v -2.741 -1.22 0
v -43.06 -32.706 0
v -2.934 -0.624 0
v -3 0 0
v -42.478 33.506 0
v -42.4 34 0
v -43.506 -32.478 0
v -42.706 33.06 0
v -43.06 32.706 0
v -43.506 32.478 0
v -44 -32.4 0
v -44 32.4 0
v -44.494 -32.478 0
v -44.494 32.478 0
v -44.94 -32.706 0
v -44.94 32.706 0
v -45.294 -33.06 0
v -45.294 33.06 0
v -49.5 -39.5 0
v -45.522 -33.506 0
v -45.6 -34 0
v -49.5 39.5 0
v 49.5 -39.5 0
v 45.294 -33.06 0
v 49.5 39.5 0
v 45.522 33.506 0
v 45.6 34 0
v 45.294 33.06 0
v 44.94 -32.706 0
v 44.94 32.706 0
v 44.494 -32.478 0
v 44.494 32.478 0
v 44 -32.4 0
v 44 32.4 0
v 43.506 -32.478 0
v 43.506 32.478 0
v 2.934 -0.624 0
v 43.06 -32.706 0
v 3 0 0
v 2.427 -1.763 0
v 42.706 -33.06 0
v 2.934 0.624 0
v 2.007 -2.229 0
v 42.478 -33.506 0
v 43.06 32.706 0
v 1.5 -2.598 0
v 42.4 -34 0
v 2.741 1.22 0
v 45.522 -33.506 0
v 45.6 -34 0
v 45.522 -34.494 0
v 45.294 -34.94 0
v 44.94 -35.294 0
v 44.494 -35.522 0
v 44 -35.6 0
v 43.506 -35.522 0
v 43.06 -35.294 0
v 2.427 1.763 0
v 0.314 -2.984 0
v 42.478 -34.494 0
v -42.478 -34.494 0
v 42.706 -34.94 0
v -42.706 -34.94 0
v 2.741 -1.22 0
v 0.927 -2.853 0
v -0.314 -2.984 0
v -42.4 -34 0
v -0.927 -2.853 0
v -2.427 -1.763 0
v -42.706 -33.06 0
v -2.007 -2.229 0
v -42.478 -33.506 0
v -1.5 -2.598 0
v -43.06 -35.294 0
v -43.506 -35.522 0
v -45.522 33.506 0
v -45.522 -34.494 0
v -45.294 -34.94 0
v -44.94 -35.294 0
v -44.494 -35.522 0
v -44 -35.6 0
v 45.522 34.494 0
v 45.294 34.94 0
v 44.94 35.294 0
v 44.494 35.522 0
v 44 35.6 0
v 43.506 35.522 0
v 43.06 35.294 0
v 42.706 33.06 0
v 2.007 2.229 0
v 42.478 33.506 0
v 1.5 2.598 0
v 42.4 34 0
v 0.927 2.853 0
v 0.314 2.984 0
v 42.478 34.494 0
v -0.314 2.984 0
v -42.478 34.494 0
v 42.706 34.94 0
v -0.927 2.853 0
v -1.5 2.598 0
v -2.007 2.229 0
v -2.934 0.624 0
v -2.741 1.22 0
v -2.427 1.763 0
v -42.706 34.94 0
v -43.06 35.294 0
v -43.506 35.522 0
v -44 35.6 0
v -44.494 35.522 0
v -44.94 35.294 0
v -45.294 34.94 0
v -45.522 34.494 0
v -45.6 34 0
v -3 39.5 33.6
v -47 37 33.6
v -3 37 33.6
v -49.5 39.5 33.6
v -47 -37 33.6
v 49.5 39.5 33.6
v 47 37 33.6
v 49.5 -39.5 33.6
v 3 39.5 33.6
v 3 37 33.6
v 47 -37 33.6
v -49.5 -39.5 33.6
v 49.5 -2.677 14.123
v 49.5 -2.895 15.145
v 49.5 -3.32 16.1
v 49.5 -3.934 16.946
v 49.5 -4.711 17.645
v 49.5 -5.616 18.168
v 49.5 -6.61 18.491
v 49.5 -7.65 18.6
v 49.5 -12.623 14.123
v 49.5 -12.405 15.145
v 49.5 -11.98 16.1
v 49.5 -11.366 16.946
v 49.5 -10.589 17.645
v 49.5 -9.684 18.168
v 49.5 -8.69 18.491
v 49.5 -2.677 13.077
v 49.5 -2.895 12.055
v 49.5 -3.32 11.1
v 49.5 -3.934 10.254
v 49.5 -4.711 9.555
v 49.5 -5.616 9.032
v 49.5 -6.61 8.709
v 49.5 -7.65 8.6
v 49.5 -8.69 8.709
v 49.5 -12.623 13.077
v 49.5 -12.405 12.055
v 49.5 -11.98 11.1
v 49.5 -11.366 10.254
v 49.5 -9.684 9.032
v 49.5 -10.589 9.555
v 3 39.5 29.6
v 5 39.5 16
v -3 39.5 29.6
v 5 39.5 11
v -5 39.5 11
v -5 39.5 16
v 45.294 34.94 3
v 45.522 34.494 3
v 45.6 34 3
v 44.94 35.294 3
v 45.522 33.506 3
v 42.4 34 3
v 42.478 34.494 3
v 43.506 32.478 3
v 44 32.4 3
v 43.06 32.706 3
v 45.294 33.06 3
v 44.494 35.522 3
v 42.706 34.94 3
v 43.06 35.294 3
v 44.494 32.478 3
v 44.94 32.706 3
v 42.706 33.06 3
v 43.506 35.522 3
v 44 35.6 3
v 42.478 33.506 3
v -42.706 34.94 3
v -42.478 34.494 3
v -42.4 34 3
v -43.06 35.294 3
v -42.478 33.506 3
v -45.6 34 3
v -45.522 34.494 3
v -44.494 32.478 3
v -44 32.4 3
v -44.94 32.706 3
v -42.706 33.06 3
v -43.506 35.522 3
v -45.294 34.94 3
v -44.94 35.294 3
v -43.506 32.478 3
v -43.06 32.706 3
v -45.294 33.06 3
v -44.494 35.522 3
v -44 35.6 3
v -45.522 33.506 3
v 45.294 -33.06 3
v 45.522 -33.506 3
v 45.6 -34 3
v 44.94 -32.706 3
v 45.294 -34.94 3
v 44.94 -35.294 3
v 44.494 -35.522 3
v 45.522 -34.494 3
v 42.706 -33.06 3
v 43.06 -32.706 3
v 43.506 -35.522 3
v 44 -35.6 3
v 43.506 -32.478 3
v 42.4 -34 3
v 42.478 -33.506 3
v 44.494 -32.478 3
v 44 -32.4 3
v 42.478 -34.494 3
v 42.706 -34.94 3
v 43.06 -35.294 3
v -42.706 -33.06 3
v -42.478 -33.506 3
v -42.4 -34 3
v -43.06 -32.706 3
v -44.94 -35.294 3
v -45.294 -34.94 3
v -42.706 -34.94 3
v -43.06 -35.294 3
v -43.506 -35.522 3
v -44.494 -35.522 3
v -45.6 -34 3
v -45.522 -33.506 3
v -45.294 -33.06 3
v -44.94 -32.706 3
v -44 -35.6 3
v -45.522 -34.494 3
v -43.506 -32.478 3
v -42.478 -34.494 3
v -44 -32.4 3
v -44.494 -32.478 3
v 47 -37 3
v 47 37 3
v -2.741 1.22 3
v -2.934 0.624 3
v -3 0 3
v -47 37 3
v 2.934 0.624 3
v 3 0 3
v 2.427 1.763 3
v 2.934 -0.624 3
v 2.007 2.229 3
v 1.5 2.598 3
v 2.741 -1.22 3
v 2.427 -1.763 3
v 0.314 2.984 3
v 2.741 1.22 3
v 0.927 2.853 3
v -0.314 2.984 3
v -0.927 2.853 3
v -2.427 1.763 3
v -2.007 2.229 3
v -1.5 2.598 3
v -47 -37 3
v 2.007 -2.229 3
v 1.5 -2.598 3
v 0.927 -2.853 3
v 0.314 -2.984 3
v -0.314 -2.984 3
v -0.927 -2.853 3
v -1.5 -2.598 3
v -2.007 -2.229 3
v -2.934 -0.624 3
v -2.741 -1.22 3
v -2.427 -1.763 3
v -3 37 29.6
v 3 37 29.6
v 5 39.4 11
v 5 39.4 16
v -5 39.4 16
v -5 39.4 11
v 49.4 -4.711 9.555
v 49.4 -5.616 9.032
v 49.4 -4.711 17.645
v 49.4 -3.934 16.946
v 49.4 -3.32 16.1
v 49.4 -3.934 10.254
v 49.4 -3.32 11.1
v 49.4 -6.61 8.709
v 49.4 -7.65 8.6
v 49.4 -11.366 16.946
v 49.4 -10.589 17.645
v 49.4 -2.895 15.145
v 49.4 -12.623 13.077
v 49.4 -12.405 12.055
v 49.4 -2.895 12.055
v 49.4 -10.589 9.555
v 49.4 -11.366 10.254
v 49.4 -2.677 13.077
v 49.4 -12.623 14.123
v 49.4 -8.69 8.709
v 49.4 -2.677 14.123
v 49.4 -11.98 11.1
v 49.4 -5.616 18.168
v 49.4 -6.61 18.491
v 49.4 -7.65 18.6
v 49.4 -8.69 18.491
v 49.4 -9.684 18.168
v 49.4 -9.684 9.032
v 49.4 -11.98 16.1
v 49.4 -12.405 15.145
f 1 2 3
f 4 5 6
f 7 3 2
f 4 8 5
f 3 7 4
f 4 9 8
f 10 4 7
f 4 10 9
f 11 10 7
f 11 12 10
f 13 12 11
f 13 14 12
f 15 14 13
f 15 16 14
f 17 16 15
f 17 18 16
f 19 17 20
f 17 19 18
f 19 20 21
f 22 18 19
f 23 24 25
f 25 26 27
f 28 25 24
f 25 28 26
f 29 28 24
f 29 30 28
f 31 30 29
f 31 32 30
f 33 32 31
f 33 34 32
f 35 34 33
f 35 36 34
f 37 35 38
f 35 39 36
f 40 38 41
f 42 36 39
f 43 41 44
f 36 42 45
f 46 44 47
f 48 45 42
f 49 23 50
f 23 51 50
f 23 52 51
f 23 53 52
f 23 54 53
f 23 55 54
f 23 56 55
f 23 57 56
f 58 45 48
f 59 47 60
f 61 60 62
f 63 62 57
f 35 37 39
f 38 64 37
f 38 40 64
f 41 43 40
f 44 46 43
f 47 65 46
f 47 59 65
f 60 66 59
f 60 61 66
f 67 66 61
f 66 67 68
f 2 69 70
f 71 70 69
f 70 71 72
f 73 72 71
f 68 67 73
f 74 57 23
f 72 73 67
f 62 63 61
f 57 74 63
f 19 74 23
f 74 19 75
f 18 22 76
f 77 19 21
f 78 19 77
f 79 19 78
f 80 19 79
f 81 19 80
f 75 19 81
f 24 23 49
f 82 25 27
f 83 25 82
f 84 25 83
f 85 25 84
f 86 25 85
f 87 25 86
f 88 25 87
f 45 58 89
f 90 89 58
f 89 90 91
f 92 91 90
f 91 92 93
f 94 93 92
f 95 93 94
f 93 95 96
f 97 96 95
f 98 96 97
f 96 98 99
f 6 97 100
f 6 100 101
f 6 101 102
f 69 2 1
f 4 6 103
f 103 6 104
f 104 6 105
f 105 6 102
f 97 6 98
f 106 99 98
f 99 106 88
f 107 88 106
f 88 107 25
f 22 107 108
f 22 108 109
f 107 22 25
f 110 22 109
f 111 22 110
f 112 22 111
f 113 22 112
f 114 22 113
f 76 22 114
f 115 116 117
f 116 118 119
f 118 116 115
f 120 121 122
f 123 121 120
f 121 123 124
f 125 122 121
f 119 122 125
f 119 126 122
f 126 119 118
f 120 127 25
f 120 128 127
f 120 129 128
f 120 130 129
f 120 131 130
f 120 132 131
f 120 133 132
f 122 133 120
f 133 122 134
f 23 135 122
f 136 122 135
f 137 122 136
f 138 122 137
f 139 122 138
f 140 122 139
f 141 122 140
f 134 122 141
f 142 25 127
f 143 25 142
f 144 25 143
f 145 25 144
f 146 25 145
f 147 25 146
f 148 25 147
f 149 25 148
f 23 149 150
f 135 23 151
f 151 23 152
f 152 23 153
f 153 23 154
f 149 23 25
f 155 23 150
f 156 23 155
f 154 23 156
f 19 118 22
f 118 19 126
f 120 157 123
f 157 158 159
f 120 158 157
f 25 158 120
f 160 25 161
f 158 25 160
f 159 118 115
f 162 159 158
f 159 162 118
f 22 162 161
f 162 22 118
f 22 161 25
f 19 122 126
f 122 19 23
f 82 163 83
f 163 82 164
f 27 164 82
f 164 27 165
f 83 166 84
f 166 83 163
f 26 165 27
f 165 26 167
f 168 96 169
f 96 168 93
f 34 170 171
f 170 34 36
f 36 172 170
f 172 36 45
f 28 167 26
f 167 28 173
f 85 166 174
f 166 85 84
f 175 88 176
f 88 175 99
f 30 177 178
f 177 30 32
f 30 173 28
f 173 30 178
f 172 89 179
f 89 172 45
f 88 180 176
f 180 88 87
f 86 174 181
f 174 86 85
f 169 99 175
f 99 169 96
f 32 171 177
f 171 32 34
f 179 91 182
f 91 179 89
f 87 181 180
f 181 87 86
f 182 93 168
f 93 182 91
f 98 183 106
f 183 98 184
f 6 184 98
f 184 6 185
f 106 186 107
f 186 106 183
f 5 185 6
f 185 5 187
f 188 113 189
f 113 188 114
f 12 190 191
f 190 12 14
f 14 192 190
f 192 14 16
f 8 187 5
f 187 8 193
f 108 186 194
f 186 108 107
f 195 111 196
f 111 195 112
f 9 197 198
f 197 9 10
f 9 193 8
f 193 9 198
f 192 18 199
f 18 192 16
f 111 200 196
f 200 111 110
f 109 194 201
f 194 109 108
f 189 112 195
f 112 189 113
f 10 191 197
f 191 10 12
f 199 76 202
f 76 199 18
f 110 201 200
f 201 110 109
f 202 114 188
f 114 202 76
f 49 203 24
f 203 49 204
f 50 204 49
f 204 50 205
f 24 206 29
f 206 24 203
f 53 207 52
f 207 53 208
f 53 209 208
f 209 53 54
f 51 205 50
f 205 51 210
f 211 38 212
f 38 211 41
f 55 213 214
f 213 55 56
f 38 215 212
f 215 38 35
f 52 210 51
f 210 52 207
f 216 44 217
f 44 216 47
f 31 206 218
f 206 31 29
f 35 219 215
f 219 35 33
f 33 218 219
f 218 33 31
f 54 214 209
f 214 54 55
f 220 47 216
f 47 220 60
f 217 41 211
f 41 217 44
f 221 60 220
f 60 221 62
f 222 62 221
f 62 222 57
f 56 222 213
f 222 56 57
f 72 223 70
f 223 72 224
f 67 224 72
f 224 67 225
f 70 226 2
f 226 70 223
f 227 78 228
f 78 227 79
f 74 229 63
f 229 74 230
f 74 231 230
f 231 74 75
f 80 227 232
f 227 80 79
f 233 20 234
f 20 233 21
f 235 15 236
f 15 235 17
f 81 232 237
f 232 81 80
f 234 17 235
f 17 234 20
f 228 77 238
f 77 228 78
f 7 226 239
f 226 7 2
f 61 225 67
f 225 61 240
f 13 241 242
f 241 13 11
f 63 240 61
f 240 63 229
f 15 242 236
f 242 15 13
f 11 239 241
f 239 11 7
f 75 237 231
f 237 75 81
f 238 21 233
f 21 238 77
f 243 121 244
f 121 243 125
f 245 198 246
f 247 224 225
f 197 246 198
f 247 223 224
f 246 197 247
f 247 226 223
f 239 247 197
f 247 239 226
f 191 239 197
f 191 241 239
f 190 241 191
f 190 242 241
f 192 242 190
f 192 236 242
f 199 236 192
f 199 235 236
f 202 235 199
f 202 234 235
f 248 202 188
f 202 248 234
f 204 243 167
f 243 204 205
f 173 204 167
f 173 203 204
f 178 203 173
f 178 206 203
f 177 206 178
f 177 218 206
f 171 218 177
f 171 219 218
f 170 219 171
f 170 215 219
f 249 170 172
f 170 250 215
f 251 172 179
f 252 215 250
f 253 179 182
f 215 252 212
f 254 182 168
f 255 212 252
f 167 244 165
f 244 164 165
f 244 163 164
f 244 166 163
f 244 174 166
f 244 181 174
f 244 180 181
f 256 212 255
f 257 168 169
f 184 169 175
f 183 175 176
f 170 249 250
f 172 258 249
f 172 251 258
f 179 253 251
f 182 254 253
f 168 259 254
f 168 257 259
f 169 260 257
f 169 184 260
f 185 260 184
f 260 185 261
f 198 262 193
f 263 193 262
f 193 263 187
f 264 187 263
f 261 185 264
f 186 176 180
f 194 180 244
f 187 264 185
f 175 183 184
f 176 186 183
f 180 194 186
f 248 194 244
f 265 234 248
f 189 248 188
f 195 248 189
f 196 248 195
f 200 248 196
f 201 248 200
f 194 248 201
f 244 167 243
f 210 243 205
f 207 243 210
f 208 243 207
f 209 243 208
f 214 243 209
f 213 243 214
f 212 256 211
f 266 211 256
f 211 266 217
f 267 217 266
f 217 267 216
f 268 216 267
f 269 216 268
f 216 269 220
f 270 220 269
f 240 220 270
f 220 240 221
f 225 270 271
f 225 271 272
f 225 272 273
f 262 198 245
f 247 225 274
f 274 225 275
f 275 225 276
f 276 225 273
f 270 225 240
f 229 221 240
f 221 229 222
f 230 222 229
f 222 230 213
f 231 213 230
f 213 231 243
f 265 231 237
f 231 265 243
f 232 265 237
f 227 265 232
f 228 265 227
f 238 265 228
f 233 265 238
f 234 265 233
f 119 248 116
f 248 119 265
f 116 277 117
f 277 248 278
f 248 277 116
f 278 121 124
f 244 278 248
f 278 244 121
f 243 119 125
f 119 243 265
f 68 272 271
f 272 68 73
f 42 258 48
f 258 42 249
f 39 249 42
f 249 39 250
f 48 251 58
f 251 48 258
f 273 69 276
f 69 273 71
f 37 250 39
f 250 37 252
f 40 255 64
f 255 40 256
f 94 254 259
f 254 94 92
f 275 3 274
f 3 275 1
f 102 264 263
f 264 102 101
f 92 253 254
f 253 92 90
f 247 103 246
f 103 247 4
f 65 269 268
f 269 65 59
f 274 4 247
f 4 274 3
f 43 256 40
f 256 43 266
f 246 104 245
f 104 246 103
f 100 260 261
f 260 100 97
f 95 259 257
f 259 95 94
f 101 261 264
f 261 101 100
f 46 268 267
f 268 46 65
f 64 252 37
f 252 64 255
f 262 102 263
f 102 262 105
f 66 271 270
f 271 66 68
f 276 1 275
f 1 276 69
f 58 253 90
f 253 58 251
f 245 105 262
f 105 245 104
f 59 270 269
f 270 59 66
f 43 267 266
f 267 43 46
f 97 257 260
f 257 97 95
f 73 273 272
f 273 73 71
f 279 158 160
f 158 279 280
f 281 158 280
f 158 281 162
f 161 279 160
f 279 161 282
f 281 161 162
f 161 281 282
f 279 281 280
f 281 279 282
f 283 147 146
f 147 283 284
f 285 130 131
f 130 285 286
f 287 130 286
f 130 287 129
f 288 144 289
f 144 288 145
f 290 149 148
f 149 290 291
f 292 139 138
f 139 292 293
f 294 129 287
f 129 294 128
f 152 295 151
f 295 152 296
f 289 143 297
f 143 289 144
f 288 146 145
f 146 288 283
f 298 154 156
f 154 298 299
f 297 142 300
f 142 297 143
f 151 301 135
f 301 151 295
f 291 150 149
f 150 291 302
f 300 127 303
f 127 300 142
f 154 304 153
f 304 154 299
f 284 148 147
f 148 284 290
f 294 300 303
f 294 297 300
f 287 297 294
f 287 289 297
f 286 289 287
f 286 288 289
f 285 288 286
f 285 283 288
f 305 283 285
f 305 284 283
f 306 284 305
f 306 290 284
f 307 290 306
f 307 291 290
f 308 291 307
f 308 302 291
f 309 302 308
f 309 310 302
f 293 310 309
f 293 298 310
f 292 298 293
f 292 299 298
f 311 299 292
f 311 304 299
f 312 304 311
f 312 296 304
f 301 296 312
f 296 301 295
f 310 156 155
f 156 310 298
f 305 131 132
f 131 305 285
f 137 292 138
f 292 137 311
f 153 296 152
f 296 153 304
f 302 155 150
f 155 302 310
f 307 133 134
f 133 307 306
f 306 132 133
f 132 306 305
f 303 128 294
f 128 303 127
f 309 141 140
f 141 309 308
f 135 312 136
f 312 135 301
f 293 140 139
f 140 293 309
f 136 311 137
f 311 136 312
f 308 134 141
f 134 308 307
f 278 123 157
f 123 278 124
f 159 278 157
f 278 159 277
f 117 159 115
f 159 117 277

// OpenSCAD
// ============================================================
// АКУСТИЧНА СТАНЦІЯ — Електронний відсік
// ------------------------------------------------------------
// Вміст: ESP32-S3 + макетна плата 70×90мм
//         nRF24L01 PA+LNA + DS3231 + Mini360 + 2S BMS
// З'єднання з акумуляторним відсіком: 4× гвинт М3
// З'єднання з мікрофонною кришкою: 4× гвинт М3
// Матеріал: PETG або ASA
// ============================================================

// --- ПАРАМЕТРИ КОМПОНЕНТІВ ----------------------------------

// Макетна плата 7×9см (основа монтажу)
pcb_x        = 90.0;
pcb_y        = 70.0;
pcb_h        = 1.6;
pcb_comp_h   = 15.0;  // висота компонентів над платою

// ESP32-S3-DevKitC-1
esp_x        = 57.15;
esp_y        = 27.94;
esp_h        = 10.0;
esp_usb_w    = 9.0;   // ширина USB-C роз'єму
esp_usb_h    = 4.0;   // висота USB-C роз'єму

// nRF24L01 PA+LNA
nrf_x        = 40.8;
nrf_y        = 15.3;
nrf_h        = 10.0;
nrf_sma_d    = 9.0;   // діаметр SMA роз'єму

// DS3231 RTC
rtc_x        = 45.0;
rtc_y        = 23.0;
rtc_h        = 14.0;

// Mini360 DC-DC
mini_x       = 18.0;
mini_y       = 12.0;
mini_h       = 8.0;   // з підстроювальним резистором

// 2S BMS
bms_x        = 47.4;
bms_y        = 23.6;
bms_h        = 4.0;

// --- ПАРАМЕТРИ КОРПУСУ --------------------------------------

wall         = 2.5;
floor_h      = 3.0;
top_flange   = 8.0;   // фланець для кріплення мікрофонної кришки

// Внутрішній розмір — під макетну плату + зазор
inner_x      = pcb_x + 4.0;
inner_y      = pcb_y + 4.0;
inner_z      = pcb_h + pcb_comp_h + 6.0;  // плата + компоненти + запас

// Зовнішній розмір
outer_x      = inner_x + wall * 2;
outer_y      = inner_y + wall * 2;
outer_z      = inner_z + floor_h;

// Гвинти М3
screw_d      = 3.2;
screw_head_d = 6.0;
screw_head_h = 3.0;
boss_d       = 8.0;
boss_h       = floor_h + 3.0;

// Отвір для дротів з акумуляторного відсіку
wire_hole_d  = 6.0;

// Антена nRF24 — бічний отвір SMA
sma_d        = 10.0;

// USB-C отвір для програмування
usb_w        = 10.0;
usb_h        = 5.0;

echo("=== РОЗМІРИ ЕЛЕКТРОННОГО ВІДСІКУ ===");
echo("Зовнішній X:", outer_x, "мм");
echo("Зовнішній Y:", outer_y, "мм");
echo("Зовнішній Z:", outer_z, "мм");
echo("Внутрішній X:", inner_x, "мм");
echo("Внутрішній Y:", inner_y, "мм");
echo("=====================================");

// --- МОДУЛІ -------------------------------------------------

// Бобишка під гвинт М3
module screw_boss(h = boss_h, with_countersink = false) {
    difference() {
        cylinder(d = boss_d, h = h, $fn = 32);
        translate([0, 0, -0.1])
            cylinder(d = screw_d, h = h + 0.2, $fn = 20);
        if (with_countersink)
            translate([0, 0, h - screw_head_h])
            cylinder(d = screw_head_d, h = screw_head_h + 0.1, $fn = 24);
    }
}

// 4 бобишки по кутах — нижні (з'єднання з акумулятором)
module bottom_bosses() {
    margin = boss_d / 2 + 1.5;
    positions = [
        [ outer_x/2 - margin,  outer_y/2 - margin],
        [-outer_x/2 + margin,  outer_y/2 - margin],
        [ outer_x/2 - margin, -outer_y/2 + margin],
        [-outer_x/2 + margin, -outer_y/2 + margin]
    ];
    for (p = positions)
        translate([p[0], p[1], 0])
        screw_boss(h = boss_h, with_countersink = false);
}

// 4 бобишки по кутах — верхні (з'єднання з мікрофонною кришкою)
module top_bosses() {
    margin = boss_d / 2 + 1.5;
    positions = [
        [ outer_x/2 - margin,  outer_y/2 - margin],
        [-outer_x/2 + margin,  outer_y/2 - margin],
        [ outer_x/2 - margin, -outer_y/2 + margin],
        [-outer_x/2 + margin, -outer_y/2 + margin]
    ];
    for (p = positions)
        translate([p[0], p[1], outer_z - 2])
        cylinder(d = boss_d, h = top_flange + 2, $fn = 32);
}

// Стійки під макетну плату (4 кути)
module pcb_standoffs() {
    h     = floor_h + 4.0;  // висота стійки
    d_out = 5.0;
    d_in  = 2.5;            // М2.5 або просто тримає плату
    positions = [
        [ pcb_x/2 - 3,  pcb_y/2 - 3],
        [-pcb_x/2 + 3,  pcb_y/2 - 3],
        [ pcb_x/2 - 3, -pcb_y/2 + 3],
        [-pcb_x/2 + 3, -pcb_y/2 + 3],
    ];
    for (p = positions)
        translate([p[0], p[1], 0])
        difference() {
            cylinder(d = d_out, h = h, $fn = 24);
            translate([0, 0, -0.1])
            cylinder(d = d_in, h = h + 0.2, $fn = 20);
        }
}

// Напрямні ребра для фіксації макетної плати
module pcb_guides() {
    rib_h = floor_h + pcb_h + 1.0;
    rib_w = 2.0;
    // По довжині X
    for (sy = [-1, 1])
        translate([-pcb_x/2, sy * (pcb_y/2 - rib_w/2) - rib_w/2, 0])
        cube([pcb_x, rib_w, rib_h]);
}

// --- ОСНОВНА ДЕТАЛЬ -----------------------------------------

module electronics_compartment() {
    difference() {
        union() {
            // Основний корпус
            translate([-outer_x/2, -outer_y/2, 0])
            cube([outer_x, outer_y, outer_z]);

            // Фланець зверху під мікрофонну кришку
            translate([-outer_x/2, -outer_y/2, outer_z])
            cube([outer_x, outer_y, top_flange]);

            // Бобишки нижні (до акумулятора)
            bottom_bosses();

            // Бобишки верхні (до мікрофонної кришки)
            top_bosses();

            // Стійки під макетну плату
            pcb_standoffs();
        }

        // Внутрішня порожнина
        translate([-inner_x/2, -inner_y/2, floor_h])
        cube([inner_x, inner_y, inner_z + top_flange + 0.1]);

        // Отвір для дротів знизу (з акумулятора)
        translate([0, 0, -0.1])
        cylinder(d = wire_hole_d, h = floor_h + 0.2, $fn = 30);

        // Отвір USB-C для програмування ESP32
        // (на передній стінці, Y+)
        translate([-usb_w/2, outer_y/2 - 0.1, floor_h + 8])
        cube([usb_w, wall + 0.2, usb_h]);

        // Отвір SMA антени nRF24
        // (на правій стінці, X+)
        translate([outer_x/2 - 0.1,
                   -nrf_y/2,
                   floor_h + pcb_h + 4 + nrf_h/2])
        rotate([0, 90, 0])
        cylinder(d = sma_d, h = wall + 0.2, $fn = 30);

        // Отвір антени LoRa Ra-02 (IPEX кабель до SMA на кришці)
        // на верхньому фланці — прохід кабелю
        translate([-3, outer_y/2 - wall - 0.1,
                   outer_z + top_flange/2])
        cube([6, wall + 0.2, top_flange/2 + 0.1]);

        // Гвинти М3 верхнього фланця (наскрізні)
        top_screw_holes();

        // Гвинти М3 нижнього фланця (наскрізні)
        bottom_screw_holes();

        // Зрізати напрямні ребра з внутрішньої порожнини
        translate([-inner_x/2, -inner_y/2, floor_h])
        cube([inner_x, inner_y, inner_z]);
    }

    // Напрямні ребра (додаємо після різниці)
    // pcb_guides();  // розкоментуй якщо потрібні
}

// Наскрізні отвори для верхніх гвинтів
module top_screw_holes() {
    margin = boss_d / 2 + 1.5;
    positions = [
        [ outer_x/2 - margin,  outer_y/2 - margin],
        [-outer_x/2 + margin,  outer_y/2 - margin],
        [ outer_x/2 - margin, -outer_y/2 + margin],
        [-outer_x/2 + margin, -outer_y/2 + margin]
    ];
    for (p = positions)
        translate([p[0], p[1], outer_z - 0.1])
        cylinder(d = screw_d, h = top_flange + 0.2, $fn = 20);
}

// Наскрізні отвори для нижніх гвинтів
module bottom_screw_holes() {
    margin = boss_d / 2 + 1.5;
    positions = [
        [ outer_x/2 - margin,  outer_y/2 - margin],
        [-outer_x/2 + margin,  outer_y/2 - margin],
        [ outer_x/2 - margin, -outer_y/2 + margin],
        [-outer_x/2 + margin, -outer_y/2 + margin]
    ];
    for (p = positions)
        translate([p[0], p[1], -0.1])
        cylinder(d = screw_d, h = boss_h + 0.2, $fn = 20);
}

// --- РЕНДЕР -------------------------------------------------

electronics_compartment();

// Для перевірки розміщення компонентів —
// розкоментуй блок нижче:

/*
color("green", 0.3)
translate([-pcb_x/2, -pcb_y/2, floor_h + 4])
cube([pcb_x, pcb_y, pcb_h]);  // макетна плата

color("red", 0.5)
translate([-esp_x/2, -esp_y/2, floor_h + 4 + pcb_h])
cube([esp_x, esp_y, esp_h]);   // ESP32-S3

color("blue", 0.5)
translate([-bms_x/2, -bms_y/2 - 20, floor_h + 4 + pcb_h])
cube([bms_x, bms_y, bms_h]);   // BMS

color("yellow", 0.5)
translate([-rtc_x/2, pcb_y/2 - rtc_y - 5, floor_h + 4 + pcb_h])
cube([rtc_x, rtc_y, rtc_h]);   // DS3231

color("orange", 0.5)
translate([pcb_x/2 - mini_x - 5, pcb_y/2 - mini_y - 5,
           floor_h + 4 + pcb_h])
cube([mini_x, mini_y, mini_h]); // Mini360
*/

// ============================================================
// ПРИМІТКИ ДЛЯ ДРУКУ:
// - Друкувати дном вниз
// - Підтримки: не потрібні
// - Заповнення: 40% gyroid
// - Периметри: 3
// - Після друку: heat inserts М3 у всі бобишки
// - USB-C отвір: для підключення програматора
// - SMA отвір: для антени nRF24L01
// ============================================================
